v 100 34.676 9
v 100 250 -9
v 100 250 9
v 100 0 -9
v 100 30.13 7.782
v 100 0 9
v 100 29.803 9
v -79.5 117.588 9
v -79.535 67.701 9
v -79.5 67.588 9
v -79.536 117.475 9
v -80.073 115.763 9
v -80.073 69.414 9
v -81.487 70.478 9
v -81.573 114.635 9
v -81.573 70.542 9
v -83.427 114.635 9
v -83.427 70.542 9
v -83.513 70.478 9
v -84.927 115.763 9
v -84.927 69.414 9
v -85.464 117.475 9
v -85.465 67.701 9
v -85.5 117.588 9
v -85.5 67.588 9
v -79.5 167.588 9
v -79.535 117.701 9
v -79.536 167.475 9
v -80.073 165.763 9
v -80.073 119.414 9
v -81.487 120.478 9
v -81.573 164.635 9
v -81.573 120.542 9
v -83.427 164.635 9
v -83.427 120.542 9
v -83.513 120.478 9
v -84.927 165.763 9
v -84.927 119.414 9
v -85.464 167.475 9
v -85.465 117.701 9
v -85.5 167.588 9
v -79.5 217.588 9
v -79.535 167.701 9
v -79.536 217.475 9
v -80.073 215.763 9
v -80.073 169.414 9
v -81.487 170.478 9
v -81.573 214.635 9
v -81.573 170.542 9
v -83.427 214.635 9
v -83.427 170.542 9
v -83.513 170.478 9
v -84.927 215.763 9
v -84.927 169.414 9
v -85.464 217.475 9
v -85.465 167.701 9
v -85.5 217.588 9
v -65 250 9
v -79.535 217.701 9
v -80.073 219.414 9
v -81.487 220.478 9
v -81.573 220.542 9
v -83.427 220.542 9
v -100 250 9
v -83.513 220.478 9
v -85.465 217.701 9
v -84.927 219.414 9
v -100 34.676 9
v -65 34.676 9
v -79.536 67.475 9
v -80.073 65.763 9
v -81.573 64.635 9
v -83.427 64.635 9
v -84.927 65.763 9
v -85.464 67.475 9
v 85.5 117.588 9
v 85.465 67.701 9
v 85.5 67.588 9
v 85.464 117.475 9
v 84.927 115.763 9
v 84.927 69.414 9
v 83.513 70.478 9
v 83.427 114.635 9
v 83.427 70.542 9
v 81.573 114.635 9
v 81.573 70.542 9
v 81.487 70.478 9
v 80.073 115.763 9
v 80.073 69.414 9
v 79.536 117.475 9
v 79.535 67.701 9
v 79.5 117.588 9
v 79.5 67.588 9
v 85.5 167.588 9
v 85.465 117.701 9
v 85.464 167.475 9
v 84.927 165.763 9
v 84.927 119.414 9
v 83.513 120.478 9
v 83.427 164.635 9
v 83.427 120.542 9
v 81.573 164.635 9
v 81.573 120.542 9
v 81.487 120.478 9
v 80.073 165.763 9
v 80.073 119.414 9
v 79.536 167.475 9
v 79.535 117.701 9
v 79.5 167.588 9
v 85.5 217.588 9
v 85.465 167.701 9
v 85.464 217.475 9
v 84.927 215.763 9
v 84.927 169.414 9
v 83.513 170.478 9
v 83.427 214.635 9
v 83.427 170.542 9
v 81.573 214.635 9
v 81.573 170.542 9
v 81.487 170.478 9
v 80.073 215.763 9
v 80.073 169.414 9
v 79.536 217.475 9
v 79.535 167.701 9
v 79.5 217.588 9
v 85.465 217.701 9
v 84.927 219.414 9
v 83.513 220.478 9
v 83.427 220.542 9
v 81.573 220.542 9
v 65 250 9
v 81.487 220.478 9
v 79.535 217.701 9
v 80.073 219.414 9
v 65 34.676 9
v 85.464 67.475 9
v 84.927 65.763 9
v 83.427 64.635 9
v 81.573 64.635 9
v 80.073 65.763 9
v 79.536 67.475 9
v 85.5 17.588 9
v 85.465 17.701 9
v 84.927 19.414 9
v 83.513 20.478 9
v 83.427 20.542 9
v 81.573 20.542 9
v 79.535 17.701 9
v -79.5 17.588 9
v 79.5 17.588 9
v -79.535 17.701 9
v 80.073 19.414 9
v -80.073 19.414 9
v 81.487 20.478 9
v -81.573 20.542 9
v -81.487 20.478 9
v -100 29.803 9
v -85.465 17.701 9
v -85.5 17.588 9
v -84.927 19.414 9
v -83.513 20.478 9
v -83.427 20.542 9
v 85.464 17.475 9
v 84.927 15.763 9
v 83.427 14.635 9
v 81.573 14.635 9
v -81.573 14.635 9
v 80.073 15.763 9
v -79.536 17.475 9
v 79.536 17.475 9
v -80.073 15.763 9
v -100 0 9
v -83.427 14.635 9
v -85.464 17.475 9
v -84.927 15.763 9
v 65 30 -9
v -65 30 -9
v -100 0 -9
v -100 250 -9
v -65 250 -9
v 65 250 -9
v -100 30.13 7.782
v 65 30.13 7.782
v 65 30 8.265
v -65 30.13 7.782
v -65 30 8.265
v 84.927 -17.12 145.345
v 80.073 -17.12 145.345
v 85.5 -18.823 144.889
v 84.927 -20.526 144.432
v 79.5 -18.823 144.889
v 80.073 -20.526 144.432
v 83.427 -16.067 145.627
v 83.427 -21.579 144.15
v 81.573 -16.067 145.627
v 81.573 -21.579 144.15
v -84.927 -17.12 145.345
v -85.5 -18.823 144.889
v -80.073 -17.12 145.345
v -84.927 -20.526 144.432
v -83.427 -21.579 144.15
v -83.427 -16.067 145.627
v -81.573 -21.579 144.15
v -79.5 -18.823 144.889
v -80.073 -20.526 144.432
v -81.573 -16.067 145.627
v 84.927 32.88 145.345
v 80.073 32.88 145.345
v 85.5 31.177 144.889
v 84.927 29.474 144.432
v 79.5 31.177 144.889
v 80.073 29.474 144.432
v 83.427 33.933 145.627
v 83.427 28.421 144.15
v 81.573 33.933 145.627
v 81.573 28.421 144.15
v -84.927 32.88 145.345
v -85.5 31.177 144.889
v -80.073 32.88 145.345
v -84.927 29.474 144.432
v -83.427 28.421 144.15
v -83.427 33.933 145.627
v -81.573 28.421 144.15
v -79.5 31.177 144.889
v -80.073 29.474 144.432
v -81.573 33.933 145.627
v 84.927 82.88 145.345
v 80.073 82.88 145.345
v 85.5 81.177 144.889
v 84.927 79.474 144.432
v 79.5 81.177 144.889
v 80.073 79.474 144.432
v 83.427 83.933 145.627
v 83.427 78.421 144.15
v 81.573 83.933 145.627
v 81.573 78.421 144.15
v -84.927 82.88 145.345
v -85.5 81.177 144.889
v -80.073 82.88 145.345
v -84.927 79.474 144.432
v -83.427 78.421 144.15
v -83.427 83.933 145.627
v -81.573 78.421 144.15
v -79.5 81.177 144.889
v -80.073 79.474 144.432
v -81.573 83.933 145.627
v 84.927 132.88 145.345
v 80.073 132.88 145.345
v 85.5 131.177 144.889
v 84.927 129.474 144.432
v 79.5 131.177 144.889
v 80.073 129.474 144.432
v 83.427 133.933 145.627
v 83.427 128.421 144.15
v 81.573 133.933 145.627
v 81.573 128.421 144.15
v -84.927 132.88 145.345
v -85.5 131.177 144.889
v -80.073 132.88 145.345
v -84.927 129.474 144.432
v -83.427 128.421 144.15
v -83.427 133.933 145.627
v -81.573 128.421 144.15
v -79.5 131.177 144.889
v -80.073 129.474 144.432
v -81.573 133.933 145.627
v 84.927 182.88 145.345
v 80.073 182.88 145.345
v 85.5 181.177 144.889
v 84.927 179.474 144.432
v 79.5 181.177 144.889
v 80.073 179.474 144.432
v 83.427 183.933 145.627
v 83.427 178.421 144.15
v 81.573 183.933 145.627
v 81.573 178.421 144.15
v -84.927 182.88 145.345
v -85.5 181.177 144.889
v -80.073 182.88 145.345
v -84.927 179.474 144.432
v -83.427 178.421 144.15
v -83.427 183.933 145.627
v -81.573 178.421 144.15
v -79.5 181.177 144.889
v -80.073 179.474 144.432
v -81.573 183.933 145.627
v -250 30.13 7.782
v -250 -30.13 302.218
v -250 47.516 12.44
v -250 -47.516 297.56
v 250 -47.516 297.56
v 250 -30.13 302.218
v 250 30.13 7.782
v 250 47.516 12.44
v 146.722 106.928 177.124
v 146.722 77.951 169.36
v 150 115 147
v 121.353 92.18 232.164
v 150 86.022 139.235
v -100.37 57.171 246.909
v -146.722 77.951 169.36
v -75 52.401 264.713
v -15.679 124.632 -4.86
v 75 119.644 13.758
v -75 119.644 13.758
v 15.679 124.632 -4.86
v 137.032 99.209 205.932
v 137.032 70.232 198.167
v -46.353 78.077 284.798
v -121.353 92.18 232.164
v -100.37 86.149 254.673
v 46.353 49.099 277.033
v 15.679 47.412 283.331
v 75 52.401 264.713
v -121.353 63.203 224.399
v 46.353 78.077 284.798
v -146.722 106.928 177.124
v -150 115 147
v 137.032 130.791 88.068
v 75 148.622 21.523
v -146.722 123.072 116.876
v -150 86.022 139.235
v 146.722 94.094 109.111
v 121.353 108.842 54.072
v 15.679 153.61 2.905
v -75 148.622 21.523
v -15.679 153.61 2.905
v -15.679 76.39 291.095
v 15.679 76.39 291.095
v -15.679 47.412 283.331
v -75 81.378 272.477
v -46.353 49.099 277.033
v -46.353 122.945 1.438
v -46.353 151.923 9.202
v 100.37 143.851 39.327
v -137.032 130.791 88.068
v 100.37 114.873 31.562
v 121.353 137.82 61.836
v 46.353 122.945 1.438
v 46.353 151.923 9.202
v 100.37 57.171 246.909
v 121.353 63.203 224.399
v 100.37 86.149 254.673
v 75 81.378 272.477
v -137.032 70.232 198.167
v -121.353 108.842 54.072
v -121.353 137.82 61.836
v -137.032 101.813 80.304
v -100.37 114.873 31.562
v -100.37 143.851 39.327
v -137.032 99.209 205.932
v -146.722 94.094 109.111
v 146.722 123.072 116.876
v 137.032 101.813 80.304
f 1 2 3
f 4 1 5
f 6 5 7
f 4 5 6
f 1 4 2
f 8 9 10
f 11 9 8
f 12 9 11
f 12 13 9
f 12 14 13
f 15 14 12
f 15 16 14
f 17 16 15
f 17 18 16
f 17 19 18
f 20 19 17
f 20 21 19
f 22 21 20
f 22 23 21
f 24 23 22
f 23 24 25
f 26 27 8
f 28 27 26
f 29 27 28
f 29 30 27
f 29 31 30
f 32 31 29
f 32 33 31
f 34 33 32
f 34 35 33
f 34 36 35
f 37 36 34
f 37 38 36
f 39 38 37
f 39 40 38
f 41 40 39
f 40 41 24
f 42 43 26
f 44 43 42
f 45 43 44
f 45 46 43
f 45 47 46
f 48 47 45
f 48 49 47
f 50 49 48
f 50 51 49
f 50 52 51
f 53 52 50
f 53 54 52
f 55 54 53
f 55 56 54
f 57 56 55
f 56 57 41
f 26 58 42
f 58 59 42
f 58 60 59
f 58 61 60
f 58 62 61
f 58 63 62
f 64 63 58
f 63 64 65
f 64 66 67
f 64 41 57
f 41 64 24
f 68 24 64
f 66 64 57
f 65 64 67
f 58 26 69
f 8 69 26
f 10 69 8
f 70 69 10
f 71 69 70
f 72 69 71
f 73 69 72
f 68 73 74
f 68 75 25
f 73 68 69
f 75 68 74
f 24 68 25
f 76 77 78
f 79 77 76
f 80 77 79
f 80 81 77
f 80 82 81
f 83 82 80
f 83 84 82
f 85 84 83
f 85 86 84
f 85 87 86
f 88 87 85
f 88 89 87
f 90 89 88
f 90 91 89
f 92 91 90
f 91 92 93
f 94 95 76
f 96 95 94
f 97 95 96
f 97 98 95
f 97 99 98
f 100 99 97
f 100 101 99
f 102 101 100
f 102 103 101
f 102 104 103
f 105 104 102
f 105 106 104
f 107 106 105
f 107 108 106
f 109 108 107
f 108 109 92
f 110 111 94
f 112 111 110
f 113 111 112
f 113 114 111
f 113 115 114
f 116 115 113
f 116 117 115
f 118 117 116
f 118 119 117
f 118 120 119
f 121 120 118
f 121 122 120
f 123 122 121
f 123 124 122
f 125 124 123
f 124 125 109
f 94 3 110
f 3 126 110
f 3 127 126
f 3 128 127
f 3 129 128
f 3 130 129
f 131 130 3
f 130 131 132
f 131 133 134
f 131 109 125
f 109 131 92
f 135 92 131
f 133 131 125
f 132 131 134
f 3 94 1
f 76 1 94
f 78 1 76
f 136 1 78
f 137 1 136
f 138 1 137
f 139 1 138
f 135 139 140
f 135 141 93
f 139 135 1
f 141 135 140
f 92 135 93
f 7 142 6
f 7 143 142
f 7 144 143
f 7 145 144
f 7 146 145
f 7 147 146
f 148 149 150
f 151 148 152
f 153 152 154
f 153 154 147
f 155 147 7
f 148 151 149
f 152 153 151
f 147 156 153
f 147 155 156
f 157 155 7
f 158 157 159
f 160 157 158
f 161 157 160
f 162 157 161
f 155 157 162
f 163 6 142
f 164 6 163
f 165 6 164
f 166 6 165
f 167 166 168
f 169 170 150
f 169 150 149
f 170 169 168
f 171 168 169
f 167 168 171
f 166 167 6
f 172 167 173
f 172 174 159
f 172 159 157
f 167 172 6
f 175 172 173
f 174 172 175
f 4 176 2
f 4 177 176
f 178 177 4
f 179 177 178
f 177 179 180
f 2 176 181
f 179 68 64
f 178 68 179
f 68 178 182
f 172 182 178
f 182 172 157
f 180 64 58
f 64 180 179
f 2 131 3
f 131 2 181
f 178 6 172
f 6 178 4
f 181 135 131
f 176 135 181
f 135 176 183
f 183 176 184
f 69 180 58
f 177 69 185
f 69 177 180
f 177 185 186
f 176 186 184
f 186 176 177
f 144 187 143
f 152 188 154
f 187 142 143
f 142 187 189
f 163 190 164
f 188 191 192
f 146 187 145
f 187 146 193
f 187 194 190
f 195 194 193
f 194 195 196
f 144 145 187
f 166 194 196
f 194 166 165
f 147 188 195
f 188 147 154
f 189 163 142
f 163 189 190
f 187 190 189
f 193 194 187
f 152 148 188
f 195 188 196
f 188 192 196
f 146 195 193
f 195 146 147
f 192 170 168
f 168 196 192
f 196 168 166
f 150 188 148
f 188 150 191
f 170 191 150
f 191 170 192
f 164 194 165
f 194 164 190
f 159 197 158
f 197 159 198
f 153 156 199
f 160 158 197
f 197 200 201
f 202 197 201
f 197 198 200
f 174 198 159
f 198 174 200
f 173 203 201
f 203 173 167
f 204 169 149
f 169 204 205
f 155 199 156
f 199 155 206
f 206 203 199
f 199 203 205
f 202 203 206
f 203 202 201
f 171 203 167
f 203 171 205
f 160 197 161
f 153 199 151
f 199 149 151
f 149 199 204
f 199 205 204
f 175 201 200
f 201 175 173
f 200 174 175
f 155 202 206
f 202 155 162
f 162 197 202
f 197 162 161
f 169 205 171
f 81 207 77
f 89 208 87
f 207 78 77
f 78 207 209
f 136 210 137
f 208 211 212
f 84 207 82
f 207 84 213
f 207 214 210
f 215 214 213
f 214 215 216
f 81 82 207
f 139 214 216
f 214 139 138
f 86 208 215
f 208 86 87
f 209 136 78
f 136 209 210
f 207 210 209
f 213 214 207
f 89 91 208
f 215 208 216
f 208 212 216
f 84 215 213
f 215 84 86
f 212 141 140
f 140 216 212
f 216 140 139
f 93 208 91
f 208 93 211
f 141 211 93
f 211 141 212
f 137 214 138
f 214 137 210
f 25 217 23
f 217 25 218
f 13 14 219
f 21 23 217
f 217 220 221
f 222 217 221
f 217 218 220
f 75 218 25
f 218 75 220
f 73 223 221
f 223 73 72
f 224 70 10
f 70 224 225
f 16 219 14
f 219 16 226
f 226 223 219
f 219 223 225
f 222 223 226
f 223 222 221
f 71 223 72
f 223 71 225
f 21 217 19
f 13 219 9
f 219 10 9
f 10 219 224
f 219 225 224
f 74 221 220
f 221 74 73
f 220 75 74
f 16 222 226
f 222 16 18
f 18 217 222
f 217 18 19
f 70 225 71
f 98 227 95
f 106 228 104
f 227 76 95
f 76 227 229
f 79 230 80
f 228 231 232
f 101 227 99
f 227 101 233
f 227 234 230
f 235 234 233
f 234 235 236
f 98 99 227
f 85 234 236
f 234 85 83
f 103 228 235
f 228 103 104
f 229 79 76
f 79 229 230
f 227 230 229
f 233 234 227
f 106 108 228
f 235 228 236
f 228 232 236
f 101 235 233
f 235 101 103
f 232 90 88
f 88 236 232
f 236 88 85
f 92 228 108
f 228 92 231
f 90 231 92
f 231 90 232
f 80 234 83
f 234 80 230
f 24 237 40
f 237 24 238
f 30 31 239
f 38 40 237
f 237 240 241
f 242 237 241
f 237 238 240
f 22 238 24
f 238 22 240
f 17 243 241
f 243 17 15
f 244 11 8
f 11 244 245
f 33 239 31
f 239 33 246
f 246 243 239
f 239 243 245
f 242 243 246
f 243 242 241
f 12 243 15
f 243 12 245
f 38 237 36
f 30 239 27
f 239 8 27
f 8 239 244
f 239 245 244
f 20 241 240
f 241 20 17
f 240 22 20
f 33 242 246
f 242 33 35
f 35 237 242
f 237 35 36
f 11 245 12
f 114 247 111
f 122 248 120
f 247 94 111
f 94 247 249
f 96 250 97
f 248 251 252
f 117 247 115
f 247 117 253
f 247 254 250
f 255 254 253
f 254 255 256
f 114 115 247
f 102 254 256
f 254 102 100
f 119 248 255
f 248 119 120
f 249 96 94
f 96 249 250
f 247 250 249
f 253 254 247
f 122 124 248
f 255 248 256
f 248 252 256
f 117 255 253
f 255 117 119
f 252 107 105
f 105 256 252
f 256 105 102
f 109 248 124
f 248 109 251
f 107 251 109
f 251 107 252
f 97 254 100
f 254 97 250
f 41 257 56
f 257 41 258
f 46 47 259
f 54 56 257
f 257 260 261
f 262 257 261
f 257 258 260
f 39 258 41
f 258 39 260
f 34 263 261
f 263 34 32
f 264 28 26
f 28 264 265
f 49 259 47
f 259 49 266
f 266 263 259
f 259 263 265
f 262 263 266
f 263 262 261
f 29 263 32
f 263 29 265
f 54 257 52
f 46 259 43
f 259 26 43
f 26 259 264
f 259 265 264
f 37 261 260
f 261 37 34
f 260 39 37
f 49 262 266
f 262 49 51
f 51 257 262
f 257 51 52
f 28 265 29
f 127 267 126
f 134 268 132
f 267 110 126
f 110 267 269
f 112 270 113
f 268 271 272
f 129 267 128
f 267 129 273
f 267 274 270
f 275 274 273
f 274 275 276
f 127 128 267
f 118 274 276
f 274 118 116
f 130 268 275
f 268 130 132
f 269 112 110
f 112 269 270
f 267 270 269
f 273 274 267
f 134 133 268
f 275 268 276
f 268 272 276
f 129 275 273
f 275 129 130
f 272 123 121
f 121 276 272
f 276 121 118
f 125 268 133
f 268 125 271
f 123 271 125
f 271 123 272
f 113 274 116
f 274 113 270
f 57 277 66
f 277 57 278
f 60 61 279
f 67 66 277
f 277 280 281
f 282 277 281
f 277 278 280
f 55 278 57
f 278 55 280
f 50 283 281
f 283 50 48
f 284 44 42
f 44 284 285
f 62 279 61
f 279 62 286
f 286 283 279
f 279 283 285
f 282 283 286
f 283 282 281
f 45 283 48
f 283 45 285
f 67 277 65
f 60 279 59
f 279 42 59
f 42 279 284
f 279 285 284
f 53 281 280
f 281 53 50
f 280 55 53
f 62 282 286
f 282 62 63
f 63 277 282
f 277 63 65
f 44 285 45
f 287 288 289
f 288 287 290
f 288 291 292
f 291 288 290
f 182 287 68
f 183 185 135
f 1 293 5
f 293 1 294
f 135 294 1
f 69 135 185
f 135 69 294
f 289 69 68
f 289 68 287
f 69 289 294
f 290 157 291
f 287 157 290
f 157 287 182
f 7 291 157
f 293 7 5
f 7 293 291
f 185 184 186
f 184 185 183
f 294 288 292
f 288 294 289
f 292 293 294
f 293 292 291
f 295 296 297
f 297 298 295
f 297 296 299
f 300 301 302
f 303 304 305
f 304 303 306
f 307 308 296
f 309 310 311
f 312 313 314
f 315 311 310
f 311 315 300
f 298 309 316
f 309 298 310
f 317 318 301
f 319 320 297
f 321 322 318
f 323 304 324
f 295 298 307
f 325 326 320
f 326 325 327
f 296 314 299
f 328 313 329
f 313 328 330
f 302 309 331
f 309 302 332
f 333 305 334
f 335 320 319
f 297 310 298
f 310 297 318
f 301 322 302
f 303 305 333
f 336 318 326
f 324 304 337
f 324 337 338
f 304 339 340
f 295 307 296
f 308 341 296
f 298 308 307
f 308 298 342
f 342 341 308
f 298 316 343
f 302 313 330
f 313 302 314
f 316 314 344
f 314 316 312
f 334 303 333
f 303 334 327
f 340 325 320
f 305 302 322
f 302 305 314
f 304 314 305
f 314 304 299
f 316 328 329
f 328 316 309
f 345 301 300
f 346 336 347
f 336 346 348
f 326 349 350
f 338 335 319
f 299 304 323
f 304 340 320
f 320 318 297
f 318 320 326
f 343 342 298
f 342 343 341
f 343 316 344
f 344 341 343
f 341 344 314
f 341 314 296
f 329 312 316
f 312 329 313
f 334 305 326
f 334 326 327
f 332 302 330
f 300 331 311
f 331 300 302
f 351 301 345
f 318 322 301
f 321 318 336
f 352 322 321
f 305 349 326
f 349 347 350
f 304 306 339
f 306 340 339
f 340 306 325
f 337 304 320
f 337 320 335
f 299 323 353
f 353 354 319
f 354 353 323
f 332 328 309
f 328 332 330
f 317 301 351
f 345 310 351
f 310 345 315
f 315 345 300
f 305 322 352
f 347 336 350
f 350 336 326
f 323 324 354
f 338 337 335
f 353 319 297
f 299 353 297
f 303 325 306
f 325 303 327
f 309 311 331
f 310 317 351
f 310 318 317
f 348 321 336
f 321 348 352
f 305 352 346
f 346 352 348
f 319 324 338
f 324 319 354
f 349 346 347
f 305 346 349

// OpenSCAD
    

mat_t = 18;

holder_outer_w = 200;
holder_wall_t = 35;
holder_outer_l = 250;

holders_h = 150;
holders_d = 6;
holders_a = 15;

len_between = 50;

translate([0, holder_outer_l/2, 0]){
    difference(){
        cube(size = [holder_outer_w, holder_outer_l, mat_t], center=true);
        translate([0,20,0]){
            cube(size = [holder_outer_w-holder_wall_t*2, holder_outer_l-20, mat_t+2], center=true);
        }
    }
}


module brett() {
    translate([0,0,300/2+5]) {
        rotate([holders_a, 0, 0]) {
            color( "SteelBlue", 0.5 ) {
            cube(size = [500, 18, 300], center=true);
            }
        }
    }
}

module round_brett() {
    translate([0,0,300/2-3]) {
        rotate([90+holders_a, 0, 0]) {
            color( "Tomato", 0.5 ) {
            cylinder(h=30, d=300);
            }
        }
    }
}

module holder(x,y, a) {
    module tmp(){
        translate([holder_outer_w/2-holder_wall_t/2,y,0]){
            rotate([a, 0, 0]) {
                cylinder(h=holders_h, d=holders_d);
            }
        }
    }
    
    tmp();
    mirror([1,0,0] ) { 
         tmp();
    }
}


brett();

translate([0,3*len_between-35,0]){
round_brett();
}

for (i = [0:len_between:holder_outer_l-20]) {
    translate([0,i+20,0]){
        holder(0,0,holders_a);
    }
}
